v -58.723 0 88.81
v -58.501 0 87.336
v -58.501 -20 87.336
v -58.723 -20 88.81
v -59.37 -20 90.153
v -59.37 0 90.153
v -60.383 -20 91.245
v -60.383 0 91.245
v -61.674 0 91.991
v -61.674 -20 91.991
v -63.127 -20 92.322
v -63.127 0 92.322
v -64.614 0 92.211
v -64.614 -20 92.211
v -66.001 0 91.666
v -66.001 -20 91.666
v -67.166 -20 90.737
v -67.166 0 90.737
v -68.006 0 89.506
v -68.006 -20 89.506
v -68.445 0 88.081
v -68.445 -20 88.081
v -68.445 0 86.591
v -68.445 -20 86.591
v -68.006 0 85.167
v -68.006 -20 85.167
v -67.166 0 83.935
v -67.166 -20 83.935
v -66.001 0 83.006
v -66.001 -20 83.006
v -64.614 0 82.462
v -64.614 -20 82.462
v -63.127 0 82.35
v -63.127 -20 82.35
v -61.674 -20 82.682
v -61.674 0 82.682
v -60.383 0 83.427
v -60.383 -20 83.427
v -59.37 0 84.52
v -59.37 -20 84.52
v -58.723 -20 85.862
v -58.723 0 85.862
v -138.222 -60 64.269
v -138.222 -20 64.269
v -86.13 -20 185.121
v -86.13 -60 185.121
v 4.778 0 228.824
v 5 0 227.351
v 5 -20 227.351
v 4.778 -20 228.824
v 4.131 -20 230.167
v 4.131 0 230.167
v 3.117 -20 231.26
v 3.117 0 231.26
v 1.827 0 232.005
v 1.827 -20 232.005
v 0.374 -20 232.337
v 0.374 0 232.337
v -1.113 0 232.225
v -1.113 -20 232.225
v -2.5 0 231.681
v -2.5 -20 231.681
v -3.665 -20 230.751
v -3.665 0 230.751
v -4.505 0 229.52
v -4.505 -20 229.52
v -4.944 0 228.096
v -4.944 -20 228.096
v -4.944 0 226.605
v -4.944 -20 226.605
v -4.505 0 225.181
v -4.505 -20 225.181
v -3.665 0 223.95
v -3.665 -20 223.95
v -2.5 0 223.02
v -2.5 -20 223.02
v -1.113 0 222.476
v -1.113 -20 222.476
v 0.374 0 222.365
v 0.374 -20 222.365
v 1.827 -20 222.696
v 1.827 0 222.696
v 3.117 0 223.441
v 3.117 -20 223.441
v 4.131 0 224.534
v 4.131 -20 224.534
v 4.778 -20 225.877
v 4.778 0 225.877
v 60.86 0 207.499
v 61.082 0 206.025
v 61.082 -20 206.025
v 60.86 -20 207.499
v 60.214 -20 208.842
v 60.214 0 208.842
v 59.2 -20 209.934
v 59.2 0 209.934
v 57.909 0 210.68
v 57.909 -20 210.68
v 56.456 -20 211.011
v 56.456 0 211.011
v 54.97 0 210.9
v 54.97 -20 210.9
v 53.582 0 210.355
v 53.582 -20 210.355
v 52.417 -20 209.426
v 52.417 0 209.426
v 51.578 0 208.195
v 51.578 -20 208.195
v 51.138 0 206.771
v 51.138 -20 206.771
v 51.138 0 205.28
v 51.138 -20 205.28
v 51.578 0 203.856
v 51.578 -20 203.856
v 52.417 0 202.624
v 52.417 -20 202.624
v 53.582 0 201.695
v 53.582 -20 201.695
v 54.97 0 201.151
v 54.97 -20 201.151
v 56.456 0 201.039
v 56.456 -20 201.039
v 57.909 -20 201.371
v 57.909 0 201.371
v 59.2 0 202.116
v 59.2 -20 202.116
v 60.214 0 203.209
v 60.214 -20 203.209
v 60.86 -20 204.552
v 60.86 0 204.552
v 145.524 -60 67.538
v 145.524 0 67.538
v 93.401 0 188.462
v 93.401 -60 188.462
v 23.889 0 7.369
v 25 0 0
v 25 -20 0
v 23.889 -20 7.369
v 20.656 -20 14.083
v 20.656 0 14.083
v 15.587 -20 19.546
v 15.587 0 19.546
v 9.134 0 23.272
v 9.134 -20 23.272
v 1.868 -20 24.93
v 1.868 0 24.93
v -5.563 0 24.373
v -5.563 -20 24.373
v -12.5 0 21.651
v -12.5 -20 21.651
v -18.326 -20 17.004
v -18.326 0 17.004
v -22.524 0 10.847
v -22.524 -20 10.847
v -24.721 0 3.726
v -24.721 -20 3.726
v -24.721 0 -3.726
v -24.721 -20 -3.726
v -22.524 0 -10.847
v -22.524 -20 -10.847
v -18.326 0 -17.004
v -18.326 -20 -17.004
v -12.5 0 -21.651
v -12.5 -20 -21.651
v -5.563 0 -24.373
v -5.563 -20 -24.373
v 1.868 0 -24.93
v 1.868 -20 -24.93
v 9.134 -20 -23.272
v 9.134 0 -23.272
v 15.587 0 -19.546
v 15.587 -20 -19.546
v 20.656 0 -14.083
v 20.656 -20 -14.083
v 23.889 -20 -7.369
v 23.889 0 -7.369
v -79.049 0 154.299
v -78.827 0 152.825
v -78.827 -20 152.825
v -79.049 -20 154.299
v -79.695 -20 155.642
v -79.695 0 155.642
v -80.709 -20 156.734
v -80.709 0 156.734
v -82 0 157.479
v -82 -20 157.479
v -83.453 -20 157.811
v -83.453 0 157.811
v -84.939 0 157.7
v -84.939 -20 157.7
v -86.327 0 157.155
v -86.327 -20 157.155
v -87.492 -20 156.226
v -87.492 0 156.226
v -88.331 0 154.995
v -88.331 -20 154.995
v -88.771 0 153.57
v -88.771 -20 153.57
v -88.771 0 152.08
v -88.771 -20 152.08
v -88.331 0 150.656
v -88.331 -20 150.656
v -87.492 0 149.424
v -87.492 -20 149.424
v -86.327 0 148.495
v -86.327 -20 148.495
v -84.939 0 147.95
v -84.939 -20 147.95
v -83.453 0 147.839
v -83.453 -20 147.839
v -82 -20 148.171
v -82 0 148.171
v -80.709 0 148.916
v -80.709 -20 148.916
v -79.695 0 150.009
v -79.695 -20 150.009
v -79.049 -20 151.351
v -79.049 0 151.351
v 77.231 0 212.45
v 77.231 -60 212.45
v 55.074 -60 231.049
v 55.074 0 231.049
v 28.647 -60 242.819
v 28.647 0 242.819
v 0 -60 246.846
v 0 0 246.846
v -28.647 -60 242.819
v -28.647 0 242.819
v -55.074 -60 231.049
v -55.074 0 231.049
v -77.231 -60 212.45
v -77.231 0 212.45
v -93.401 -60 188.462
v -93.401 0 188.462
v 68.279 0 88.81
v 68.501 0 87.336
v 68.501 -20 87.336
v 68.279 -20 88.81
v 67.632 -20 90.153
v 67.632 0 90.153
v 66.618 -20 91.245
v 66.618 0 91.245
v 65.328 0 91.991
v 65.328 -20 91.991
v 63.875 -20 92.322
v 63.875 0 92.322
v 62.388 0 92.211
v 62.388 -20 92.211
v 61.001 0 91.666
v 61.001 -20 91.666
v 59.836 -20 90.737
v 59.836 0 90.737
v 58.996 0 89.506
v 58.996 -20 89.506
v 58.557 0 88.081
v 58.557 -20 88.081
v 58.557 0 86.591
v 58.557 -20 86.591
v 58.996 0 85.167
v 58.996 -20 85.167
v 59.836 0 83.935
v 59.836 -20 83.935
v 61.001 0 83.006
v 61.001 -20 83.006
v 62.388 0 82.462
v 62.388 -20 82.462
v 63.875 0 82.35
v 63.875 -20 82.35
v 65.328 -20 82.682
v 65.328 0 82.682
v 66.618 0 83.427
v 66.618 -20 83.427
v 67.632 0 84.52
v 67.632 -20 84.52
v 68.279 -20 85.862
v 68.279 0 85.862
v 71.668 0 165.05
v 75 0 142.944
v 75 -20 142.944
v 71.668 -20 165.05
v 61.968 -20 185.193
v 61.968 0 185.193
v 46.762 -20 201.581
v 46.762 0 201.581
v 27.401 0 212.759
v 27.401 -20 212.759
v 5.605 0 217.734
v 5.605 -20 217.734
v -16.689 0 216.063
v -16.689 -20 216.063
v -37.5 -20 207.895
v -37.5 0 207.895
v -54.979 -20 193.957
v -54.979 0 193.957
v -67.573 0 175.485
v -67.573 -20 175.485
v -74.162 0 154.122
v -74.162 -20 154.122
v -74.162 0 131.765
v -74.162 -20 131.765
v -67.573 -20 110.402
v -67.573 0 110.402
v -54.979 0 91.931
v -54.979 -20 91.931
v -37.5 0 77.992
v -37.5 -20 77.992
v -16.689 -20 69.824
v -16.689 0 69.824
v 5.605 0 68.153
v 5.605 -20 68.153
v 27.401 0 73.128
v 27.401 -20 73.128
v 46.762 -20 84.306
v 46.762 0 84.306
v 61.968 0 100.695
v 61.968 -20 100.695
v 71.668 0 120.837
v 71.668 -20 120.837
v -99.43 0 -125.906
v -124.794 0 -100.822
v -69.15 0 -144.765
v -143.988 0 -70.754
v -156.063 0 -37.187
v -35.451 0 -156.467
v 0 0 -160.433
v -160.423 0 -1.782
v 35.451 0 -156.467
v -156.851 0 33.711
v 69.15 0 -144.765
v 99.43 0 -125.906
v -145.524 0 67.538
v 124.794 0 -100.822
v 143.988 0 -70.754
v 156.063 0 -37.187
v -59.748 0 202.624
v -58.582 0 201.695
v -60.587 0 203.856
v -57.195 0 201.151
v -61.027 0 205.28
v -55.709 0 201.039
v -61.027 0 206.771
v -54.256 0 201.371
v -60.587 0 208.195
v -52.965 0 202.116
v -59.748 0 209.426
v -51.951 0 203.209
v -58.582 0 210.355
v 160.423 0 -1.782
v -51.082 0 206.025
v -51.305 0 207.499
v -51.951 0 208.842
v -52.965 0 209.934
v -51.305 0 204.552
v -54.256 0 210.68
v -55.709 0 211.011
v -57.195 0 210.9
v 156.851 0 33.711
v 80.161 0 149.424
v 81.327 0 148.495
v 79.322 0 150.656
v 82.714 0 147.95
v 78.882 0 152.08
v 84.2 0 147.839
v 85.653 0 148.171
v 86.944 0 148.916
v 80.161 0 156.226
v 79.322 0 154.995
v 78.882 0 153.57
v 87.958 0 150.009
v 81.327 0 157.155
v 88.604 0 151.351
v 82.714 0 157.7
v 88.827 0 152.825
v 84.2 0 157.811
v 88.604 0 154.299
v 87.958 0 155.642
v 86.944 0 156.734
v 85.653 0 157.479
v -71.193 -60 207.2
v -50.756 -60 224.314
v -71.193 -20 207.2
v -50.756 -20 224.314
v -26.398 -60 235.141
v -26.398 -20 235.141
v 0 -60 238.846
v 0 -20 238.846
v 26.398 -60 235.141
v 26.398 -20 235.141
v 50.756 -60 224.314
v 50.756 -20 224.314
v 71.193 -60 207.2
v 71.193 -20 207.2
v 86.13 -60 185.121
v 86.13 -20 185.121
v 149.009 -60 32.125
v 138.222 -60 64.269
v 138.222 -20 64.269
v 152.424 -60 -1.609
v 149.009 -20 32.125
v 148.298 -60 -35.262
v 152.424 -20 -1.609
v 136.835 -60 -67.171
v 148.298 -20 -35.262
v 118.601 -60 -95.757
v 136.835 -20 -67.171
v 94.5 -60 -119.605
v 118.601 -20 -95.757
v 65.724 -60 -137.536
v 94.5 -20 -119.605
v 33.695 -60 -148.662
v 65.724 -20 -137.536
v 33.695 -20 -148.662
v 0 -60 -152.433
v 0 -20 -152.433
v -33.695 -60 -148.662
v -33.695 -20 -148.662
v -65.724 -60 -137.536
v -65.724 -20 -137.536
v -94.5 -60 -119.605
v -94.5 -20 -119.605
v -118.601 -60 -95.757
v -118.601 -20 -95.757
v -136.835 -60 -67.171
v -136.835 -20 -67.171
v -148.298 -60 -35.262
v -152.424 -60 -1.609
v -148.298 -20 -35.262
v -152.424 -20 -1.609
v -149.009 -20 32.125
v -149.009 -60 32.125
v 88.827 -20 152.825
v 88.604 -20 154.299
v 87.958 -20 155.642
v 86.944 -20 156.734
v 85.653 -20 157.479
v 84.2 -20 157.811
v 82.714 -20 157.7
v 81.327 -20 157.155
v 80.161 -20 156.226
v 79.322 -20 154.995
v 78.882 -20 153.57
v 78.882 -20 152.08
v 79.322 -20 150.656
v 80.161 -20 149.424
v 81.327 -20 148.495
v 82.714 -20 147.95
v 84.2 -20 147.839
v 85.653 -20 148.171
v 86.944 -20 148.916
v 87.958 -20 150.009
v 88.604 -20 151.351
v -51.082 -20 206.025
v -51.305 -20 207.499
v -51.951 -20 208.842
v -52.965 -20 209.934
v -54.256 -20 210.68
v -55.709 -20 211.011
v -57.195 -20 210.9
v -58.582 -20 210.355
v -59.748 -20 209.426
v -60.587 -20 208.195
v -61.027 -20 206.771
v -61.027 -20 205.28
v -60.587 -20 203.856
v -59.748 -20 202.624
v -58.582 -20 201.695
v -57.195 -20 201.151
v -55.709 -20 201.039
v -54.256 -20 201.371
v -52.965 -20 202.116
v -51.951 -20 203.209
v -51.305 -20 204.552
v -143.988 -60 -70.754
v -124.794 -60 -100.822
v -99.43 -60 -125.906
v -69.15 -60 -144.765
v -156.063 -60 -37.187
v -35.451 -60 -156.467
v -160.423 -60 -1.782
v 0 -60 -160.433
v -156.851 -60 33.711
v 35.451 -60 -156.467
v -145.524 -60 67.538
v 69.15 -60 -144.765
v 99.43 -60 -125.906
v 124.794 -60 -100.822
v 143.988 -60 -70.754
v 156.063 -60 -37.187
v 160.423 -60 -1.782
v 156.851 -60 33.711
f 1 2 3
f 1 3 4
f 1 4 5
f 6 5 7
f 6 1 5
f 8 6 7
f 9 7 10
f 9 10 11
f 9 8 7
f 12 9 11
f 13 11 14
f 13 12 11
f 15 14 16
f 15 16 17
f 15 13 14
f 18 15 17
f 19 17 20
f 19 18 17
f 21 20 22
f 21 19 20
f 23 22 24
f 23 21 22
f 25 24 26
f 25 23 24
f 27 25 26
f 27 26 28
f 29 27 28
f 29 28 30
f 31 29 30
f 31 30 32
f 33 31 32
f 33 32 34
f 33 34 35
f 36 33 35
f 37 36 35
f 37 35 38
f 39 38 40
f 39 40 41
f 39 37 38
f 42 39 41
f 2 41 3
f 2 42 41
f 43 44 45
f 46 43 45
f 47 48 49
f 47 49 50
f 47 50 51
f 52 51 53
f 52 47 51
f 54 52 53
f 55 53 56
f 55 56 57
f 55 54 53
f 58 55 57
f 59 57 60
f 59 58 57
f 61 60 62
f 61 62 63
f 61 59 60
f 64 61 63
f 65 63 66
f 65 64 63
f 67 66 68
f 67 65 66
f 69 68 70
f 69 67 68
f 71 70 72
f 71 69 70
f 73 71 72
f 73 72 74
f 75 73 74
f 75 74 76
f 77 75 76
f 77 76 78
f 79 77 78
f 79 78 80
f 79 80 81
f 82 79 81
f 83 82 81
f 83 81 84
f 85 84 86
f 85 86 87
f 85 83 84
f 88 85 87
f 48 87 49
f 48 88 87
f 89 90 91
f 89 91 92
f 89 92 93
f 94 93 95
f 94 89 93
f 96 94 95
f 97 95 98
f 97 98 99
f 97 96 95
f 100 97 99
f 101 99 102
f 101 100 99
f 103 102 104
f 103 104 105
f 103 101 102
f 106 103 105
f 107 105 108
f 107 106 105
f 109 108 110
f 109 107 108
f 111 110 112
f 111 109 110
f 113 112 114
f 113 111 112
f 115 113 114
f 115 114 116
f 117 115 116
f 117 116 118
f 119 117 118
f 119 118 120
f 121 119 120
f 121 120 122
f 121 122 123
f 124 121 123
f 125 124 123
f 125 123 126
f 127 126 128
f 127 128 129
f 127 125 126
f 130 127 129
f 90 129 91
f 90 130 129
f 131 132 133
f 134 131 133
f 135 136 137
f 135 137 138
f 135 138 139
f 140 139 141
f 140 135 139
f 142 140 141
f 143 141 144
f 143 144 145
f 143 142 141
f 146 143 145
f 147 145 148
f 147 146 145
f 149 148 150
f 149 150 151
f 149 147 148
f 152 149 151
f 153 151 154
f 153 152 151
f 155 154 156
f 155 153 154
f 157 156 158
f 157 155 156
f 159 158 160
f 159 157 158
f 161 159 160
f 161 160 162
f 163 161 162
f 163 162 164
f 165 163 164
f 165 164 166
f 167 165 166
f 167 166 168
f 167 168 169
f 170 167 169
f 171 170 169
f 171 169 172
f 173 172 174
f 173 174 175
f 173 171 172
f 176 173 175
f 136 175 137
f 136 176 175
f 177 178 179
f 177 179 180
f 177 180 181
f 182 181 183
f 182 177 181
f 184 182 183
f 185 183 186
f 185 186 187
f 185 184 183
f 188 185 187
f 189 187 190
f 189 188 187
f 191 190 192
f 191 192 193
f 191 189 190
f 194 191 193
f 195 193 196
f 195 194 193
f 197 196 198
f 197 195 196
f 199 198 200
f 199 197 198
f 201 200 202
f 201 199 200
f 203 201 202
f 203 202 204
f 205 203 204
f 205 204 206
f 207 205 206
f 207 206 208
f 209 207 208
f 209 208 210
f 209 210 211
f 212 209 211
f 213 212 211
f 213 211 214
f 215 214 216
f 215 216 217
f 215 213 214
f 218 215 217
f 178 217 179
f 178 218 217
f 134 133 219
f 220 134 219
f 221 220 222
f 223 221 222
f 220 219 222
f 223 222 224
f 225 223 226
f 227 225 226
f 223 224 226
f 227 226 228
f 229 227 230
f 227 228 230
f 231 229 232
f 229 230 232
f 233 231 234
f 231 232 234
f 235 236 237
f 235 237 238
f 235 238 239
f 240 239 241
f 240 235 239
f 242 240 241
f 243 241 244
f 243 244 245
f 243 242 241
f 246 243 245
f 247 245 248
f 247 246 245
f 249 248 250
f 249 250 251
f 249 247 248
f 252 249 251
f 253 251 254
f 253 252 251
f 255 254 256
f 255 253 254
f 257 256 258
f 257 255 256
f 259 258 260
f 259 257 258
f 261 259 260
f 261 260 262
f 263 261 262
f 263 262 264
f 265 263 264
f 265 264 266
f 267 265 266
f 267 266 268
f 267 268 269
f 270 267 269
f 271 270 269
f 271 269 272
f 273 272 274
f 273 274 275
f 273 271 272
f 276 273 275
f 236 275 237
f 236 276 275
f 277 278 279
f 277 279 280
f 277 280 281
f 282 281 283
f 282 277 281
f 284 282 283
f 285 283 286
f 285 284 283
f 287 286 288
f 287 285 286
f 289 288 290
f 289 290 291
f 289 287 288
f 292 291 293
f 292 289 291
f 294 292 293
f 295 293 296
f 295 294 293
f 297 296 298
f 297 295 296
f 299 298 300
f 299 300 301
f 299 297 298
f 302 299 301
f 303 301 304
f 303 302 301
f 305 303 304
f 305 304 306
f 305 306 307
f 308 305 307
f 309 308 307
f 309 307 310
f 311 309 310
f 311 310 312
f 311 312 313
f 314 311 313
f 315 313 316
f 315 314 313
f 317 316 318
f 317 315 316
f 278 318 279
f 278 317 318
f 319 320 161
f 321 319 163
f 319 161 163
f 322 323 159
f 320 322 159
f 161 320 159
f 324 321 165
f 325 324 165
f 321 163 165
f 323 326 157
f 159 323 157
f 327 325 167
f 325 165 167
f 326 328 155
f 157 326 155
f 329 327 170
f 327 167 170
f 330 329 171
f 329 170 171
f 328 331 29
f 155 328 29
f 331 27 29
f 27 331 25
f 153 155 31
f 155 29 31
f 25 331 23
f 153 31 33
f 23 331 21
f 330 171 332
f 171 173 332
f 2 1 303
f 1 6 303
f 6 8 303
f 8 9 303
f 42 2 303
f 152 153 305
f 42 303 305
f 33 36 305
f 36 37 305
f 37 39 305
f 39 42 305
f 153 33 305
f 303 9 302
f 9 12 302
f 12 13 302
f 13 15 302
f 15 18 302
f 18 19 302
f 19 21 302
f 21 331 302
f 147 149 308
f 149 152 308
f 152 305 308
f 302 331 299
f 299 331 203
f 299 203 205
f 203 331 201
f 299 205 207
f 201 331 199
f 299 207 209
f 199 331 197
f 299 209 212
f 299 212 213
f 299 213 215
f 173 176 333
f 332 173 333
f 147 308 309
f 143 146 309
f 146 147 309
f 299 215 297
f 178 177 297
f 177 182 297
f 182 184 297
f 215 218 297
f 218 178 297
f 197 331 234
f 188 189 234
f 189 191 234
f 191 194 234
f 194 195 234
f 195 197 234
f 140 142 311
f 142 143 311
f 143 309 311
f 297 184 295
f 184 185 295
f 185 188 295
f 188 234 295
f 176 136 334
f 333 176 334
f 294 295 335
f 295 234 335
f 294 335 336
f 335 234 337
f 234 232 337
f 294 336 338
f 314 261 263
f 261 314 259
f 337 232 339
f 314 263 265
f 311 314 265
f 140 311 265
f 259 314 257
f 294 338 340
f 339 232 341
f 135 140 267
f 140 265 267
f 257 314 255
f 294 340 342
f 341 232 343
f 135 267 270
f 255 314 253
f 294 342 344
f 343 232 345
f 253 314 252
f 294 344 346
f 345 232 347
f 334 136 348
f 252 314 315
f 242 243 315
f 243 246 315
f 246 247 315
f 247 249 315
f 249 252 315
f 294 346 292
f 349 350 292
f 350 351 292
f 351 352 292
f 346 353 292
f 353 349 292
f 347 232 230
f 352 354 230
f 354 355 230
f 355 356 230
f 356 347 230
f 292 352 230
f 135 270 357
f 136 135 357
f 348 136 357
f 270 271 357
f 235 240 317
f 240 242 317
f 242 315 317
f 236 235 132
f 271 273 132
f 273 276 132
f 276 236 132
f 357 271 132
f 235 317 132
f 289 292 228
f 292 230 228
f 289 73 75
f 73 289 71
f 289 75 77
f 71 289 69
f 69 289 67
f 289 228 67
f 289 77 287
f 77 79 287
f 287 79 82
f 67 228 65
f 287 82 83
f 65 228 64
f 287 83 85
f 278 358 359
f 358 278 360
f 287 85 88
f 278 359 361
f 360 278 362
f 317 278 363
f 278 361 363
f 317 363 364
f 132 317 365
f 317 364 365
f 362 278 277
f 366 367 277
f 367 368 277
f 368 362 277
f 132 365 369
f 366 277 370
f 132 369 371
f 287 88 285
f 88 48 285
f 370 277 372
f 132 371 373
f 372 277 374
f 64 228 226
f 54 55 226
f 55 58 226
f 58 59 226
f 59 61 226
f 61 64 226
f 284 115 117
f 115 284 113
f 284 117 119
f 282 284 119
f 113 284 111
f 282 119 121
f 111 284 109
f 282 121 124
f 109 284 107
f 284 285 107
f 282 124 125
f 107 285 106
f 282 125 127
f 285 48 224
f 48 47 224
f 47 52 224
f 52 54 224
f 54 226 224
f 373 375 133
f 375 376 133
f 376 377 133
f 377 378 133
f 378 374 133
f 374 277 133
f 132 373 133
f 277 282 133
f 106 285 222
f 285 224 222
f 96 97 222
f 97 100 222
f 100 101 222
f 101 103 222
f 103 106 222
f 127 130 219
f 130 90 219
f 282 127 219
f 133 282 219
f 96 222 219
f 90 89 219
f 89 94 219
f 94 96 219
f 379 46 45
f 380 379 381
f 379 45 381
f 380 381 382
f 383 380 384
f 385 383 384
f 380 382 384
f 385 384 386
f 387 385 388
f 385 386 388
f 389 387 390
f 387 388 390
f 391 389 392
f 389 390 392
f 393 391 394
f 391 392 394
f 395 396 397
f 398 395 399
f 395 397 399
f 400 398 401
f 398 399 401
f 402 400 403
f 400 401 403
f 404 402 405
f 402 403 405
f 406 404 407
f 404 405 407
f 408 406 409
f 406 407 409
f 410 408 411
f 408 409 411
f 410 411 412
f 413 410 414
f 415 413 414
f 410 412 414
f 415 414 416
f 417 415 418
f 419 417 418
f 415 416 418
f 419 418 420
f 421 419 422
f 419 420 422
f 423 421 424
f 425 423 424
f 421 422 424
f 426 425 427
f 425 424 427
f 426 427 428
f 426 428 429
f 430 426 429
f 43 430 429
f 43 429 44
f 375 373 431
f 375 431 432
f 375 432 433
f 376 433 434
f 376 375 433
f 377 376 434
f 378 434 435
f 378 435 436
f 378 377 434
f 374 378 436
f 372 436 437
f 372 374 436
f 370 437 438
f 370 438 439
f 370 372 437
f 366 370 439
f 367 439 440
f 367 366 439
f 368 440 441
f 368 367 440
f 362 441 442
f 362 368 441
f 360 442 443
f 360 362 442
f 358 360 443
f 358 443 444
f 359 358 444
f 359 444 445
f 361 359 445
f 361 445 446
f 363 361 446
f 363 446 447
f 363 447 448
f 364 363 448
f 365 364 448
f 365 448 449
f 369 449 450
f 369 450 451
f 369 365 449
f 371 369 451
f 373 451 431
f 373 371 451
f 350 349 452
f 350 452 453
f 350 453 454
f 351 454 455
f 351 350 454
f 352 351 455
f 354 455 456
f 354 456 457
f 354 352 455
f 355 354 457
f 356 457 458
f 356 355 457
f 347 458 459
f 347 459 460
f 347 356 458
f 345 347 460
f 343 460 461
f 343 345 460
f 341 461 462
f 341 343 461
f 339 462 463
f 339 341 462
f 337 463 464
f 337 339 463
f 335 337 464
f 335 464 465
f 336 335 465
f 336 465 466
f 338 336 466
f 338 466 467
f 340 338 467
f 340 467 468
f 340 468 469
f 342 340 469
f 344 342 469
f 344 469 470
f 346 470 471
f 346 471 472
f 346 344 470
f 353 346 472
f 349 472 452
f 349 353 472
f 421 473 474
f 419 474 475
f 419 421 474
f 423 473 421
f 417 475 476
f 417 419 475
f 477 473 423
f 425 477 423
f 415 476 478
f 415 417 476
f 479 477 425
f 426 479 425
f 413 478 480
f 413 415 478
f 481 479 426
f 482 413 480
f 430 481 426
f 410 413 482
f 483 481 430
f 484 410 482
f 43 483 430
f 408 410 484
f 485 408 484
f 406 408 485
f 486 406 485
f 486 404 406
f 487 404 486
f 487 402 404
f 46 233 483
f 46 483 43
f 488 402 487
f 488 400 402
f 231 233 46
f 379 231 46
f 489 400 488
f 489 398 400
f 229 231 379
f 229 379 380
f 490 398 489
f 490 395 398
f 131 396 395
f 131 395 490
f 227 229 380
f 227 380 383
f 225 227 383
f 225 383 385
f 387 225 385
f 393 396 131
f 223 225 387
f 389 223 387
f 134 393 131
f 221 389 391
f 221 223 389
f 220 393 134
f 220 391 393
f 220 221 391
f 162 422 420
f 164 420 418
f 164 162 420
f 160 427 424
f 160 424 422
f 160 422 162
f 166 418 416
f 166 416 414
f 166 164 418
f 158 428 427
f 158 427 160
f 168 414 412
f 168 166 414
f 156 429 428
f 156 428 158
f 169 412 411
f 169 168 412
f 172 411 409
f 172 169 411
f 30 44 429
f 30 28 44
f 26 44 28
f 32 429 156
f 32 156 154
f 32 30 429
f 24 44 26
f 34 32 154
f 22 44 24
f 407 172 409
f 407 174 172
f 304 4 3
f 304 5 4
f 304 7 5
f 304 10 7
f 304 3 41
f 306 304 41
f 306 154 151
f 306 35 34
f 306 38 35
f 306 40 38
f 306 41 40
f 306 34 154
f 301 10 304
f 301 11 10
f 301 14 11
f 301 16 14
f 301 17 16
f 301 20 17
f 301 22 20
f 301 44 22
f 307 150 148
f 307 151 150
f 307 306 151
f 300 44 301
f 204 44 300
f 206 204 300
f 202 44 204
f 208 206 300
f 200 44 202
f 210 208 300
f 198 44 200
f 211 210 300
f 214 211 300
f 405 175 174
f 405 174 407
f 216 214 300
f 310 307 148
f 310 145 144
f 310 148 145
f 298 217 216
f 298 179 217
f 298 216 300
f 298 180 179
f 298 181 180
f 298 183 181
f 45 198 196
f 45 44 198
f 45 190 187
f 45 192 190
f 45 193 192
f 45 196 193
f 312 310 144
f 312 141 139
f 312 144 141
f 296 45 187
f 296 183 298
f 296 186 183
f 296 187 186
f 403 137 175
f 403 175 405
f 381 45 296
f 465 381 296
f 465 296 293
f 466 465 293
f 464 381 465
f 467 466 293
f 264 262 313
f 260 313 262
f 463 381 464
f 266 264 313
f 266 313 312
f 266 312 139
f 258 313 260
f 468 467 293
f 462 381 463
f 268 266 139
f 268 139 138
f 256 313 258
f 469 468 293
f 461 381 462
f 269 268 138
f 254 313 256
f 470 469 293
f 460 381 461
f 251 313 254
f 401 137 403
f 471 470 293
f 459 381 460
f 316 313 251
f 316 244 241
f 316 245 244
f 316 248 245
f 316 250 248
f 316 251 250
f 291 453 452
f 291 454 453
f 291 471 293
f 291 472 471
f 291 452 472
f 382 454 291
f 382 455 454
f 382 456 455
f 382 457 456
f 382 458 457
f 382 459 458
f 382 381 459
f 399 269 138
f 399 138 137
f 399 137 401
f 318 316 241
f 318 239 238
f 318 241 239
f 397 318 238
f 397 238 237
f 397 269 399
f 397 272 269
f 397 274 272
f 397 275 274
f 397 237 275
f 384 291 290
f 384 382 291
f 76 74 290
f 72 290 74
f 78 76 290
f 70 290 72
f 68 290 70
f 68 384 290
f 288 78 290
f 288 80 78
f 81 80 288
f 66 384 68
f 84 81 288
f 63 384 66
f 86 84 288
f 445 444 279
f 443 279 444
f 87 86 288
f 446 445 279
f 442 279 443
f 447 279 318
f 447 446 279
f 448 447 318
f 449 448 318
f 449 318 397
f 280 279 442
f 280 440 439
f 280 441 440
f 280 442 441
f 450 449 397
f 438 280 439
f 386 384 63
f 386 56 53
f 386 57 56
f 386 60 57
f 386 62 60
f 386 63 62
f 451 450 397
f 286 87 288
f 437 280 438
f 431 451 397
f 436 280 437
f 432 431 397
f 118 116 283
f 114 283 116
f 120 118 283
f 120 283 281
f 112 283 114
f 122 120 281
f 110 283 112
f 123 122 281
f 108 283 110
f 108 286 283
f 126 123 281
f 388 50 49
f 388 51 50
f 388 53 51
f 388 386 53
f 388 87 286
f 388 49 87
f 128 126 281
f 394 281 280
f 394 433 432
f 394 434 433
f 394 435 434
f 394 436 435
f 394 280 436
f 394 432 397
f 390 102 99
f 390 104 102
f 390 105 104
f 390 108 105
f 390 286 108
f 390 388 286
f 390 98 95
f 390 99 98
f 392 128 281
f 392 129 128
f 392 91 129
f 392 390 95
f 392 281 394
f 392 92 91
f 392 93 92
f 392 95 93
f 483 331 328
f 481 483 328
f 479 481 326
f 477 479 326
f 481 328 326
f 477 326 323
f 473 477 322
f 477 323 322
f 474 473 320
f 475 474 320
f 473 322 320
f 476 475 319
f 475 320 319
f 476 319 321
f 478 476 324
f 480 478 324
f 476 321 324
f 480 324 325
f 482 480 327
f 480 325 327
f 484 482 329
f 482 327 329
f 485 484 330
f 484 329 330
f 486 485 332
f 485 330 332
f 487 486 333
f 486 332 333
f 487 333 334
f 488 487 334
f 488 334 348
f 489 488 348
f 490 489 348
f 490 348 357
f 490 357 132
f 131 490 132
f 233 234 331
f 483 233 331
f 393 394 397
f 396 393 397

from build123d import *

# Parameters (mm, degrees)
F0_R     = 25
F0_R_2   = 5
F0_R_3   = 75
F1_DEPTH = 20
F2_DEPTH = 60


with BuildPart() as f1:
    # F0 (on Front) → F1 (new body)
    with BuildSketch(Plane.XZ):
        with BuildLine():
            ThreePointArc((86.129578, 185.121394), (0, 238.845987), (-86.129578, 185.121394))
            Line((-86.129578, 185.121394), (-138.221827, 64.268738))
            ThreePointArc((-138.221827, 64.268738), (0, -152.432753), (138.221827, 64.268738))
            Line((138.221827, 64.268738), (86.129578, 185.121394))
        make_face()
        Circle(F0_R, mode=Mode.SUBTRACT)
        with Locations((-63.50091, 87.336254)):
            Circle(F0_R_2, mode=Mode.SUBTRACT)
        with Locations((-83.826575, 152.82513)):
            Circle(F0_R_2, mode=Mode.SUBTRACT)
        with Locations((-56.082384, 206.025317)):
            Circle(F0_R_2, mode=Mode.SUBTRACT)
        with Locations((63.50091, 87.336254)):
            Circle(F0_R_2, mode=Mode.SUBTRACT)
        with Locations((0, 142.943576)):
            Circle(F0_R_3, mode=Mode.SUBTRACT)
        with Locations((0, 227.350565)):
            Circle(F0_R_2, mode=Mode.SUBTRACT)
        with Locations((56.082384, 206.025317)):
            Circle(F0_R_2, mode=Mode.SUBTRACT)
        with Locations((83.826575, 152.82513)):
            Circle(F0_R_2, mode=Mode.SUBTRACT)
    extrude(amount=F1_DEPTH)

    # F0 (on Front) → F2 (join)
    with BuildSketch(Plane.XZ):
        with BuildLine():
            Line((145.524237, 67.537877), (93.401044, 188.462319))
            ThreePointArc((93.401044, 188.462319), (0, 246.845987), (-93.401044, 188.462319))
            Line((-93.401044, 188.462319), (-145.524237, 67.537877))
            ThreePointArc((-145.524237, 67.537877), (0, -160.432753), (145.524237, 67.537877))
        make_face()
        with BuildLine():
            Line((-138.221827, 64.268738), (-86.129578, 185.121394))
            ThreePointArc((-86.129578, 185.121394), (0, 238.845987), (86.129578, 185.121394))
            Line((86.129578, 185.121394), (138.221827, 64.268738))
            ThreePointArc((138.221827, 64.268738), (0, -152.432753), (-138.221827, 64.268738))
        make_face(mode=Mode.SUBTRACT)
    extrude(amount=F2_DEPTH)


solid = f1.part
